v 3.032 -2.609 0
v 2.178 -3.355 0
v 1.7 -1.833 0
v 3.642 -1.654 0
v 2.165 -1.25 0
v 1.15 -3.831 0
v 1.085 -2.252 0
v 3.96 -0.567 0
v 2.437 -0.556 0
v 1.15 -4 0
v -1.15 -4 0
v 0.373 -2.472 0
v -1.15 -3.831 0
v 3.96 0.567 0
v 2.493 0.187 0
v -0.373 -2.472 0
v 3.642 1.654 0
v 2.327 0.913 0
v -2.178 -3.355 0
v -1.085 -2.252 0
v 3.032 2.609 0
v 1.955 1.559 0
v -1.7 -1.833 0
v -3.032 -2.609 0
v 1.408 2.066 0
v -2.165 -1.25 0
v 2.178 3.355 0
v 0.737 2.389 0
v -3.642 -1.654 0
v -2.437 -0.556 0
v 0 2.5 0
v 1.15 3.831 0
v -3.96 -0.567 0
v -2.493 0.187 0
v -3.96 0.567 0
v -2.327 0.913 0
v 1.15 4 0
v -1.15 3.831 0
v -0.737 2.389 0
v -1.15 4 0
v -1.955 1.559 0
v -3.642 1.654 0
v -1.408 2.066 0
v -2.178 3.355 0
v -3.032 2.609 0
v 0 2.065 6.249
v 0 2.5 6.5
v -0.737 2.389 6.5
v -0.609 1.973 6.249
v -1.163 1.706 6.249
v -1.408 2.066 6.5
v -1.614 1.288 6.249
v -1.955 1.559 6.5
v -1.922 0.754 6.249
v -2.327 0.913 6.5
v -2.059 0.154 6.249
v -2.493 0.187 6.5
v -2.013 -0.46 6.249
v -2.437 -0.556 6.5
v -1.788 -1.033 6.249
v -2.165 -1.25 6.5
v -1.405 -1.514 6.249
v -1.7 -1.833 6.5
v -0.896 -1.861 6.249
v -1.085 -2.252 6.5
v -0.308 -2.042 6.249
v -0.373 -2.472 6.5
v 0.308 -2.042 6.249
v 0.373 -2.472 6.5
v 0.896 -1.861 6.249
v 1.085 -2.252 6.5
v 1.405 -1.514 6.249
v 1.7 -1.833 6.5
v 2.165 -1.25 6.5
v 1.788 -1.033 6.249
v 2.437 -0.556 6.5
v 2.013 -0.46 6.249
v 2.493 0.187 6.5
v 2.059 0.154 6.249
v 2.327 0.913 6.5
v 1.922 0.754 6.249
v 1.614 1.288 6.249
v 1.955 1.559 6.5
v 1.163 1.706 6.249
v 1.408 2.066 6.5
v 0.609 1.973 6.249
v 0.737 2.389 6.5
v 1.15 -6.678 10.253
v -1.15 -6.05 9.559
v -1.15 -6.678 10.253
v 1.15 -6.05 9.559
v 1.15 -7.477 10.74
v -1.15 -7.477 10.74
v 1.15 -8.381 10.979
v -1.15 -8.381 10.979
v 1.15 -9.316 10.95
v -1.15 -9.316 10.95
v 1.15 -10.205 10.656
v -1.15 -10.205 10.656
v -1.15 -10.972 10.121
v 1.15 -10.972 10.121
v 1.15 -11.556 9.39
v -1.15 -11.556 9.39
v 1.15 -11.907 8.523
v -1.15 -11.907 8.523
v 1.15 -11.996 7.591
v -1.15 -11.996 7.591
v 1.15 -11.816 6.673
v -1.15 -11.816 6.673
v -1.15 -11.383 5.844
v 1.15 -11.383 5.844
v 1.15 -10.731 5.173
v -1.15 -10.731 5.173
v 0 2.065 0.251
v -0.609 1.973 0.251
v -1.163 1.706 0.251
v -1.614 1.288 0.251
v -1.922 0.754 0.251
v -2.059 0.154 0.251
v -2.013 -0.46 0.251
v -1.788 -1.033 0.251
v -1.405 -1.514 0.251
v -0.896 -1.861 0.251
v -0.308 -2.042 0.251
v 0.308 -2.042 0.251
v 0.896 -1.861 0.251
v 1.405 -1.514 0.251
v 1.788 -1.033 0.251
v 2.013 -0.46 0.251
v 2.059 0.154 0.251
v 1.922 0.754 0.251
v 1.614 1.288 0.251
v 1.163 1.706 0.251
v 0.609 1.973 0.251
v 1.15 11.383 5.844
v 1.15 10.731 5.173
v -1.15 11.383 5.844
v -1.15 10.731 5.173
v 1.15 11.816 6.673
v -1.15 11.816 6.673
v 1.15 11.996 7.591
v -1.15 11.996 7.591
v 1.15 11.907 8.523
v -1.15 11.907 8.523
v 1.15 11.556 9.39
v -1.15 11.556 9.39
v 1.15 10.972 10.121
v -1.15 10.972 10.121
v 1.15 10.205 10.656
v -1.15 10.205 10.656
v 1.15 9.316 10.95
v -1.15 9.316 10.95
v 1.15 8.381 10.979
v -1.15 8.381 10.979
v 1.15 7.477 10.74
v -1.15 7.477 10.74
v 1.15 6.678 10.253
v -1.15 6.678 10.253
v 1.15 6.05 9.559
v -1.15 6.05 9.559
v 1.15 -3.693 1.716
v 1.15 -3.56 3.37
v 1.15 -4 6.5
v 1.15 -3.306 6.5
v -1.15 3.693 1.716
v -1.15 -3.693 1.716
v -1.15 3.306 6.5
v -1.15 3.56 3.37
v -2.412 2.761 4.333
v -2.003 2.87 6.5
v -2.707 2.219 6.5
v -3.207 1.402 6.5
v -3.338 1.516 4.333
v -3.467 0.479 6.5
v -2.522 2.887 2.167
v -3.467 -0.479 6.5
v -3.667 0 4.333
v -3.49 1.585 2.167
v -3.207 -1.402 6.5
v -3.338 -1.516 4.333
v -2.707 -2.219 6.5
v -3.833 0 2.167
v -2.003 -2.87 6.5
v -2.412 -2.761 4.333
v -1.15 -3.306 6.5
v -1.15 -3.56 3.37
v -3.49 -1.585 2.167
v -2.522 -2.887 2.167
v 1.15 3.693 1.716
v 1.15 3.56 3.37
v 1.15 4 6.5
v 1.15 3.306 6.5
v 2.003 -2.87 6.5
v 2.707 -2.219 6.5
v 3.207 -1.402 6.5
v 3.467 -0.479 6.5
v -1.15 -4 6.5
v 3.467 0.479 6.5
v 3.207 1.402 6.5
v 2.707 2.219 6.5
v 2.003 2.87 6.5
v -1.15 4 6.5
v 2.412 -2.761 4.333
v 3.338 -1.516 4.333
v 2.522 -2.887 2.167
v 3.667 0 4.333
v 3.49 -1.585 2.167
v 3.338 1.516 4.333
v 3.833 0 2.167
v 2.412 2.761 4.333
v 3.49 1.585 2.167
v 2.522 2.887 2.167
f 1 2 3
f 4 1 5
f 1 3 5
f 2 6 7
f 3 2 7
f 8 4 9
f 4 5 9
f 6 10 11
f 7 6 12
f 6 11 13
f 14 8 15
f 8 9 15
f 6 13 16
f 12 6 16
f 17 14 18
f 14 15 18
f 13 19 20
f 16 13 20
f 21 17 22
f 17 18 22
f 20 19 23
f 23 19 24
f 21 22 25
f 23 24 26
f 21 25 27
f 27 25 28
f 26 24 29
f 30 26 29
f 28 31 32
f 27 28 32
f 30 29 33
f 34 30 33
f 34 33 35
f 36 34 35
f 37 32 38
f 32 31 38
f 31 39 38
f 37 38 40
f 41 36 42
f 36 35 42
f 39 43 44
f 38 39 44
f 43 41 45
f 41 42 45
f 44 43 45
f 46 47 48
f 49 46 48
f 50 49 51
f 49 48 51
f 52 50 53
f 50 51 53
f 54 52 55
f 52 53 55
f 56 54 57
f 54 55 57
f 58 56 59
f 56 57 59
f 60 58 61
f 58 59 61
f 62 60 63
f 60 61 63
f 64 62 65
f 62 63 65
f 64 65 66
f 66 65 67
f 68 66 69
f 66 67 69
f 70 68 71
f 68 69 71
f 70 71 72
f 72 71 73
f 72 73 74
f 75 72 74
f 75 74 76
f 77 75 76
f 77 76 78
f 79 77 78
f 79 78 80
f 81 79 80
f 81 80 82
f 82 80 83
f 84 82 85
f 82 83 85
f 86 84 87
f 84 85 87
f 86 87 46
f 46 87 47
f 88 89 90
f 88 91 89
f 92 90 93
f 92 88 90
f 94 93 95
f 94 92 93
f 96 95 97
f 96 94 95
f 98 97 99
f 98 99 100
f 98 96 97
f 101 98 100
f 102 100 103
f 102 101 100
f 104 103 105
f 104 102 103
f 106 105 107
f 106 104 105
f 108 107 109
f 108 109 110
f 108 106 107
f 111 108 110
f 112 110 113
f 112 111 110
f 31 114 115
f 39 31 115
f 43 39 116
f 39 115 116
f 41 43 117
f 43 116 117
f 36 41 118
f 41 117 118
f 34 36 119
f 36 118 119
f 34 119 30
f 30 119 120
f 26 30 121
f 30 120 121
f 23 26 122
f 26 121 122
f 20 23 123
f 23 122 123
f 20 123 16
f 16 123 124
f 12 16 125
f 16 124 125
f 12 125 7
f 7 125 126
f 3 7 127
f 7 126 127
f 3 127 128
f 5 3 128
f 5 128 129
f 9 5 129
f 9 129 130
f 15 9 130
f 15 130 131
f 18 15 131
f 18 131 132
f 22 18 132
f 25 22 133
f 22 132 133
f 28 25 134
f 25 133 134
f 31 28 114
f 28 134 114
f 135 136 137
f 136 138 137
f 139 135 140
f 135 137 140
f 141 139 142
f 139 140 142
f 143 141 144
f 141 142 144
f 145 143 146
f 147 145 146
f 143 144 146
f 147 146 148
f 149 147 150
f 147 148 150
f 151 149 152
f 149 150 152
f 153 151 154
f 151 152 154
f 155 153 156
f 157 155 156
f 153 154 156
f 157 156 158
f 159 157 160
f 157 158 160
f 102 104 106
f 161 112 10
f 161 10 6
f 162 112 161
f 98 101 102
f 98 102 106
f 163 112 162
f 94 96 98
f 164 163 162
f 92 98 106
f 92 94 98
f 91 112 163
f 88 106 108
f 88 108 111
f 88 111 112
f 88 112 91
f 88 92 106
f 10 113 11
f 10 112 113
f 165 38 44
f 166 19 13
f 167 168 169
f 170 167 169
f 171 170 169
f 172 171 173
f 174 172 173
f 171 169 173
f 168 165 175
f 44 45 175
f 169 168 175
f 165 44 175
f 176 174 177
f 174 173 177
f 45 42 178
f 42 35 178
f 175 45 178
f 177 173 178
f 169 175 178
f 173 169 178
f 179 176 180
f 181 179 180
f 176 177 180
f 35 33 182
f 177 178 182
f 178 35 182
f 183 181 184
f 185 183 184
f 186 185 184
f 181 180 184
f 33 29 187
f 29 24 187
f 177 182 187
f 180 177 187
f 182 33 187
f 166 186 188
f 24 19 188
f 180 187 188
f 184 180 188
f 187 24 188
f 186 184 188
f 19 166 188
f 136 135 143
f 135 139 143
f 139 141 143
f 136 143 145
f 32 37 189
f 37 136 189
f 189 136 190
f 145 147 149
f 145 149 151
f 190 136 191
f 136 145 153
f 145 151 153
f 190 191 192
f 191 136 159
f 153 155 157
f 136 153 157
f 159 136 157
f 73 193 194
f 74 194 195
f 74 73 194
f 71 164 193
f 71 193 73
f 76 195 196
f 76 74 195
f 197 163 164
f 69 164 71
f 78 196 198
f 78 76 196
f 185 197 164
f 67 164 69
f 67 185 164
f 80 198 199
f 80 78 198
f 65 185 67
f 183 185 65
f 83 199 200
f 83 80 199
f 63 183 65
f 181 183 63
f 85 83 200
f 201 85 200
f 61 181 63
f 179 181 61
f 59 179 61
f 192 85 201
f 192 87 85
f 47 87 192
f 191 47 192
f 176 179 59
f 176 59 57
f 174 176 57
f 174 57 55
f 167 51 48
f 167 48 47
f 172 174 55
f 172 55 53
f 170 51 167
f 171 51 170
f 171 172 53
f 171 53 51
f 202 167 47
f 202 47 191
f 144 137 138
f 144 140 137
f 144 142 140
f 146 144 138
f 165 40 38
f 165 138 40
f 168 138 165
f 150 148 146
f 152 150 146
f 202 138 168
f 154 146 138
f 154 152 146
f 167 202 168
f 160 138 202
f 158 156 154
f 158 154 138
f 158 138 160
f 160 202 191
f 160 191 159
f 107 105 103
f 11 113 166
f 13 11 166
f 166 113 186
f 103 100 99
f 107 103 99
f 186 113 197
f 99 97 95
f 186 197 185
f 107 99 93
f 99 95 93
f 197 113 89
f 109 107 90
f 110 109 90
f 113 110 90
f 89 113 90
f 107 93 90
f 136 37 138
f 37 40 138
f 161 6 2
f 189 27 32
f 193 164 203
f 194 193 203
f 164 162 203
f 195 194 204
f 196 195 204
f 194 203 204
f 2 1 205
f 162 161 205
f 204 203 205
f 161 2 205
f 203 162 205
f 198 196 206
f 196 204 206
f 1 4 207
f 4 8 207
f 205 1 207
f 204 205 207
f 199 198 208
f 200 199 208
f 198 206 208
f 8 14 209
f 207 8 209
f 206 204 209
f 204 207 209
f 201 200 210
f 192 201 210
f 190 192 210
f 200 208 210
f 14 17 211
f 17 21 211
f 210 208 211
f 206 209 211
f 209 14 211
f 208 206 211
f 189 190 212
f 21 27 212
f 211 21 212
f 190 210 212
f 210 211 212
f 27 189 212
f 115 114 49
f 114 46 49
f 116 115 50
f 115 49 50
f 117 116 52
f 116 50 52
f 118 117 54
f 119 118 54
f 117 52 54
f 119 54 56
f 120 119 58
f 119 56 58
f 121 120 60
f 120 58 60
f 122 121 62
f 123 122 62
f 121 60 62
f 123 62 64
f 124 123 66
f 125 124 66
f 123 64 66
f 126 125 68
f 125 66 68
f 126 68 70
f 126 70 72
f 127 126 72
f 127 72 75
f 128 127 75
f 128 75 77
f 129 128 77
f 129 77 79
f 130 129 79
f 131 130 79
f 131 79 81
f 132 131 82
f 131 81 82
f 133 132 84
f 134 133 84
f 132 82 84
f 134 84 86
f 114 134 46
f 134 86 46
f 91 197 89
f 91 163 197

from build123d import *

# Parameters (mm, degrees)
PAD_DEPTH = 1.15


with BuildPart() as pad:
    # Sketch001 → Pad (new body, symmetric)
    with BuildSketch(Plane.YZ):
        with BuildLine():
            Line((2.5, 0), (2.5, 6.5))
            Line((2.5, 6.5), (4, 6.5))
            Line((4, 6.5), (6.050198, 9.559301))
            ThreePointArc((10.730567, 5.173209), (10.972336, 10.121439), (6.050198, 9.559301))
            Line((4, 0), (10.730567, 5.173209))
            Line((2.5, 0), (4, 0))
        make_face()
        with BuildLine():
            Line((-10.730567, 5.173209), (-4, 0))
            Line((-4, 0), (-2.5, 0))
            Line((-2.5, 0), (-2.5, 6.5))
            Line((-2.5, 6.5), (-4, 6.5))
            Line((-4, 6.5), (-6.050198, 9.559301))
            ThreePointArc((-6.050198, 9.559301), (-10.972336, 10.121439), (-10.730567, 5.173209))
        make_face()
    extrude(amount=PAD_DEPTH, both=True)


with BuildPart() as fl_gelmutter_din_315_m5:
    # Sketch → Revolution (revolve)
    with BuildSketch(Plane.YZ):
        Polygon((2.5, 0), (2.065, 0.251147), (2.065, 6.248853), (2.5, 6.5), (3.5, 6.5), (4, 0), align=None)
    revolve(axis=Axis((0, 0, 0), (0, 0, 1)))

    # Fusion: union Pad
    add(pad.part)


solid = fl_gelmutter_din_315_m5.part
